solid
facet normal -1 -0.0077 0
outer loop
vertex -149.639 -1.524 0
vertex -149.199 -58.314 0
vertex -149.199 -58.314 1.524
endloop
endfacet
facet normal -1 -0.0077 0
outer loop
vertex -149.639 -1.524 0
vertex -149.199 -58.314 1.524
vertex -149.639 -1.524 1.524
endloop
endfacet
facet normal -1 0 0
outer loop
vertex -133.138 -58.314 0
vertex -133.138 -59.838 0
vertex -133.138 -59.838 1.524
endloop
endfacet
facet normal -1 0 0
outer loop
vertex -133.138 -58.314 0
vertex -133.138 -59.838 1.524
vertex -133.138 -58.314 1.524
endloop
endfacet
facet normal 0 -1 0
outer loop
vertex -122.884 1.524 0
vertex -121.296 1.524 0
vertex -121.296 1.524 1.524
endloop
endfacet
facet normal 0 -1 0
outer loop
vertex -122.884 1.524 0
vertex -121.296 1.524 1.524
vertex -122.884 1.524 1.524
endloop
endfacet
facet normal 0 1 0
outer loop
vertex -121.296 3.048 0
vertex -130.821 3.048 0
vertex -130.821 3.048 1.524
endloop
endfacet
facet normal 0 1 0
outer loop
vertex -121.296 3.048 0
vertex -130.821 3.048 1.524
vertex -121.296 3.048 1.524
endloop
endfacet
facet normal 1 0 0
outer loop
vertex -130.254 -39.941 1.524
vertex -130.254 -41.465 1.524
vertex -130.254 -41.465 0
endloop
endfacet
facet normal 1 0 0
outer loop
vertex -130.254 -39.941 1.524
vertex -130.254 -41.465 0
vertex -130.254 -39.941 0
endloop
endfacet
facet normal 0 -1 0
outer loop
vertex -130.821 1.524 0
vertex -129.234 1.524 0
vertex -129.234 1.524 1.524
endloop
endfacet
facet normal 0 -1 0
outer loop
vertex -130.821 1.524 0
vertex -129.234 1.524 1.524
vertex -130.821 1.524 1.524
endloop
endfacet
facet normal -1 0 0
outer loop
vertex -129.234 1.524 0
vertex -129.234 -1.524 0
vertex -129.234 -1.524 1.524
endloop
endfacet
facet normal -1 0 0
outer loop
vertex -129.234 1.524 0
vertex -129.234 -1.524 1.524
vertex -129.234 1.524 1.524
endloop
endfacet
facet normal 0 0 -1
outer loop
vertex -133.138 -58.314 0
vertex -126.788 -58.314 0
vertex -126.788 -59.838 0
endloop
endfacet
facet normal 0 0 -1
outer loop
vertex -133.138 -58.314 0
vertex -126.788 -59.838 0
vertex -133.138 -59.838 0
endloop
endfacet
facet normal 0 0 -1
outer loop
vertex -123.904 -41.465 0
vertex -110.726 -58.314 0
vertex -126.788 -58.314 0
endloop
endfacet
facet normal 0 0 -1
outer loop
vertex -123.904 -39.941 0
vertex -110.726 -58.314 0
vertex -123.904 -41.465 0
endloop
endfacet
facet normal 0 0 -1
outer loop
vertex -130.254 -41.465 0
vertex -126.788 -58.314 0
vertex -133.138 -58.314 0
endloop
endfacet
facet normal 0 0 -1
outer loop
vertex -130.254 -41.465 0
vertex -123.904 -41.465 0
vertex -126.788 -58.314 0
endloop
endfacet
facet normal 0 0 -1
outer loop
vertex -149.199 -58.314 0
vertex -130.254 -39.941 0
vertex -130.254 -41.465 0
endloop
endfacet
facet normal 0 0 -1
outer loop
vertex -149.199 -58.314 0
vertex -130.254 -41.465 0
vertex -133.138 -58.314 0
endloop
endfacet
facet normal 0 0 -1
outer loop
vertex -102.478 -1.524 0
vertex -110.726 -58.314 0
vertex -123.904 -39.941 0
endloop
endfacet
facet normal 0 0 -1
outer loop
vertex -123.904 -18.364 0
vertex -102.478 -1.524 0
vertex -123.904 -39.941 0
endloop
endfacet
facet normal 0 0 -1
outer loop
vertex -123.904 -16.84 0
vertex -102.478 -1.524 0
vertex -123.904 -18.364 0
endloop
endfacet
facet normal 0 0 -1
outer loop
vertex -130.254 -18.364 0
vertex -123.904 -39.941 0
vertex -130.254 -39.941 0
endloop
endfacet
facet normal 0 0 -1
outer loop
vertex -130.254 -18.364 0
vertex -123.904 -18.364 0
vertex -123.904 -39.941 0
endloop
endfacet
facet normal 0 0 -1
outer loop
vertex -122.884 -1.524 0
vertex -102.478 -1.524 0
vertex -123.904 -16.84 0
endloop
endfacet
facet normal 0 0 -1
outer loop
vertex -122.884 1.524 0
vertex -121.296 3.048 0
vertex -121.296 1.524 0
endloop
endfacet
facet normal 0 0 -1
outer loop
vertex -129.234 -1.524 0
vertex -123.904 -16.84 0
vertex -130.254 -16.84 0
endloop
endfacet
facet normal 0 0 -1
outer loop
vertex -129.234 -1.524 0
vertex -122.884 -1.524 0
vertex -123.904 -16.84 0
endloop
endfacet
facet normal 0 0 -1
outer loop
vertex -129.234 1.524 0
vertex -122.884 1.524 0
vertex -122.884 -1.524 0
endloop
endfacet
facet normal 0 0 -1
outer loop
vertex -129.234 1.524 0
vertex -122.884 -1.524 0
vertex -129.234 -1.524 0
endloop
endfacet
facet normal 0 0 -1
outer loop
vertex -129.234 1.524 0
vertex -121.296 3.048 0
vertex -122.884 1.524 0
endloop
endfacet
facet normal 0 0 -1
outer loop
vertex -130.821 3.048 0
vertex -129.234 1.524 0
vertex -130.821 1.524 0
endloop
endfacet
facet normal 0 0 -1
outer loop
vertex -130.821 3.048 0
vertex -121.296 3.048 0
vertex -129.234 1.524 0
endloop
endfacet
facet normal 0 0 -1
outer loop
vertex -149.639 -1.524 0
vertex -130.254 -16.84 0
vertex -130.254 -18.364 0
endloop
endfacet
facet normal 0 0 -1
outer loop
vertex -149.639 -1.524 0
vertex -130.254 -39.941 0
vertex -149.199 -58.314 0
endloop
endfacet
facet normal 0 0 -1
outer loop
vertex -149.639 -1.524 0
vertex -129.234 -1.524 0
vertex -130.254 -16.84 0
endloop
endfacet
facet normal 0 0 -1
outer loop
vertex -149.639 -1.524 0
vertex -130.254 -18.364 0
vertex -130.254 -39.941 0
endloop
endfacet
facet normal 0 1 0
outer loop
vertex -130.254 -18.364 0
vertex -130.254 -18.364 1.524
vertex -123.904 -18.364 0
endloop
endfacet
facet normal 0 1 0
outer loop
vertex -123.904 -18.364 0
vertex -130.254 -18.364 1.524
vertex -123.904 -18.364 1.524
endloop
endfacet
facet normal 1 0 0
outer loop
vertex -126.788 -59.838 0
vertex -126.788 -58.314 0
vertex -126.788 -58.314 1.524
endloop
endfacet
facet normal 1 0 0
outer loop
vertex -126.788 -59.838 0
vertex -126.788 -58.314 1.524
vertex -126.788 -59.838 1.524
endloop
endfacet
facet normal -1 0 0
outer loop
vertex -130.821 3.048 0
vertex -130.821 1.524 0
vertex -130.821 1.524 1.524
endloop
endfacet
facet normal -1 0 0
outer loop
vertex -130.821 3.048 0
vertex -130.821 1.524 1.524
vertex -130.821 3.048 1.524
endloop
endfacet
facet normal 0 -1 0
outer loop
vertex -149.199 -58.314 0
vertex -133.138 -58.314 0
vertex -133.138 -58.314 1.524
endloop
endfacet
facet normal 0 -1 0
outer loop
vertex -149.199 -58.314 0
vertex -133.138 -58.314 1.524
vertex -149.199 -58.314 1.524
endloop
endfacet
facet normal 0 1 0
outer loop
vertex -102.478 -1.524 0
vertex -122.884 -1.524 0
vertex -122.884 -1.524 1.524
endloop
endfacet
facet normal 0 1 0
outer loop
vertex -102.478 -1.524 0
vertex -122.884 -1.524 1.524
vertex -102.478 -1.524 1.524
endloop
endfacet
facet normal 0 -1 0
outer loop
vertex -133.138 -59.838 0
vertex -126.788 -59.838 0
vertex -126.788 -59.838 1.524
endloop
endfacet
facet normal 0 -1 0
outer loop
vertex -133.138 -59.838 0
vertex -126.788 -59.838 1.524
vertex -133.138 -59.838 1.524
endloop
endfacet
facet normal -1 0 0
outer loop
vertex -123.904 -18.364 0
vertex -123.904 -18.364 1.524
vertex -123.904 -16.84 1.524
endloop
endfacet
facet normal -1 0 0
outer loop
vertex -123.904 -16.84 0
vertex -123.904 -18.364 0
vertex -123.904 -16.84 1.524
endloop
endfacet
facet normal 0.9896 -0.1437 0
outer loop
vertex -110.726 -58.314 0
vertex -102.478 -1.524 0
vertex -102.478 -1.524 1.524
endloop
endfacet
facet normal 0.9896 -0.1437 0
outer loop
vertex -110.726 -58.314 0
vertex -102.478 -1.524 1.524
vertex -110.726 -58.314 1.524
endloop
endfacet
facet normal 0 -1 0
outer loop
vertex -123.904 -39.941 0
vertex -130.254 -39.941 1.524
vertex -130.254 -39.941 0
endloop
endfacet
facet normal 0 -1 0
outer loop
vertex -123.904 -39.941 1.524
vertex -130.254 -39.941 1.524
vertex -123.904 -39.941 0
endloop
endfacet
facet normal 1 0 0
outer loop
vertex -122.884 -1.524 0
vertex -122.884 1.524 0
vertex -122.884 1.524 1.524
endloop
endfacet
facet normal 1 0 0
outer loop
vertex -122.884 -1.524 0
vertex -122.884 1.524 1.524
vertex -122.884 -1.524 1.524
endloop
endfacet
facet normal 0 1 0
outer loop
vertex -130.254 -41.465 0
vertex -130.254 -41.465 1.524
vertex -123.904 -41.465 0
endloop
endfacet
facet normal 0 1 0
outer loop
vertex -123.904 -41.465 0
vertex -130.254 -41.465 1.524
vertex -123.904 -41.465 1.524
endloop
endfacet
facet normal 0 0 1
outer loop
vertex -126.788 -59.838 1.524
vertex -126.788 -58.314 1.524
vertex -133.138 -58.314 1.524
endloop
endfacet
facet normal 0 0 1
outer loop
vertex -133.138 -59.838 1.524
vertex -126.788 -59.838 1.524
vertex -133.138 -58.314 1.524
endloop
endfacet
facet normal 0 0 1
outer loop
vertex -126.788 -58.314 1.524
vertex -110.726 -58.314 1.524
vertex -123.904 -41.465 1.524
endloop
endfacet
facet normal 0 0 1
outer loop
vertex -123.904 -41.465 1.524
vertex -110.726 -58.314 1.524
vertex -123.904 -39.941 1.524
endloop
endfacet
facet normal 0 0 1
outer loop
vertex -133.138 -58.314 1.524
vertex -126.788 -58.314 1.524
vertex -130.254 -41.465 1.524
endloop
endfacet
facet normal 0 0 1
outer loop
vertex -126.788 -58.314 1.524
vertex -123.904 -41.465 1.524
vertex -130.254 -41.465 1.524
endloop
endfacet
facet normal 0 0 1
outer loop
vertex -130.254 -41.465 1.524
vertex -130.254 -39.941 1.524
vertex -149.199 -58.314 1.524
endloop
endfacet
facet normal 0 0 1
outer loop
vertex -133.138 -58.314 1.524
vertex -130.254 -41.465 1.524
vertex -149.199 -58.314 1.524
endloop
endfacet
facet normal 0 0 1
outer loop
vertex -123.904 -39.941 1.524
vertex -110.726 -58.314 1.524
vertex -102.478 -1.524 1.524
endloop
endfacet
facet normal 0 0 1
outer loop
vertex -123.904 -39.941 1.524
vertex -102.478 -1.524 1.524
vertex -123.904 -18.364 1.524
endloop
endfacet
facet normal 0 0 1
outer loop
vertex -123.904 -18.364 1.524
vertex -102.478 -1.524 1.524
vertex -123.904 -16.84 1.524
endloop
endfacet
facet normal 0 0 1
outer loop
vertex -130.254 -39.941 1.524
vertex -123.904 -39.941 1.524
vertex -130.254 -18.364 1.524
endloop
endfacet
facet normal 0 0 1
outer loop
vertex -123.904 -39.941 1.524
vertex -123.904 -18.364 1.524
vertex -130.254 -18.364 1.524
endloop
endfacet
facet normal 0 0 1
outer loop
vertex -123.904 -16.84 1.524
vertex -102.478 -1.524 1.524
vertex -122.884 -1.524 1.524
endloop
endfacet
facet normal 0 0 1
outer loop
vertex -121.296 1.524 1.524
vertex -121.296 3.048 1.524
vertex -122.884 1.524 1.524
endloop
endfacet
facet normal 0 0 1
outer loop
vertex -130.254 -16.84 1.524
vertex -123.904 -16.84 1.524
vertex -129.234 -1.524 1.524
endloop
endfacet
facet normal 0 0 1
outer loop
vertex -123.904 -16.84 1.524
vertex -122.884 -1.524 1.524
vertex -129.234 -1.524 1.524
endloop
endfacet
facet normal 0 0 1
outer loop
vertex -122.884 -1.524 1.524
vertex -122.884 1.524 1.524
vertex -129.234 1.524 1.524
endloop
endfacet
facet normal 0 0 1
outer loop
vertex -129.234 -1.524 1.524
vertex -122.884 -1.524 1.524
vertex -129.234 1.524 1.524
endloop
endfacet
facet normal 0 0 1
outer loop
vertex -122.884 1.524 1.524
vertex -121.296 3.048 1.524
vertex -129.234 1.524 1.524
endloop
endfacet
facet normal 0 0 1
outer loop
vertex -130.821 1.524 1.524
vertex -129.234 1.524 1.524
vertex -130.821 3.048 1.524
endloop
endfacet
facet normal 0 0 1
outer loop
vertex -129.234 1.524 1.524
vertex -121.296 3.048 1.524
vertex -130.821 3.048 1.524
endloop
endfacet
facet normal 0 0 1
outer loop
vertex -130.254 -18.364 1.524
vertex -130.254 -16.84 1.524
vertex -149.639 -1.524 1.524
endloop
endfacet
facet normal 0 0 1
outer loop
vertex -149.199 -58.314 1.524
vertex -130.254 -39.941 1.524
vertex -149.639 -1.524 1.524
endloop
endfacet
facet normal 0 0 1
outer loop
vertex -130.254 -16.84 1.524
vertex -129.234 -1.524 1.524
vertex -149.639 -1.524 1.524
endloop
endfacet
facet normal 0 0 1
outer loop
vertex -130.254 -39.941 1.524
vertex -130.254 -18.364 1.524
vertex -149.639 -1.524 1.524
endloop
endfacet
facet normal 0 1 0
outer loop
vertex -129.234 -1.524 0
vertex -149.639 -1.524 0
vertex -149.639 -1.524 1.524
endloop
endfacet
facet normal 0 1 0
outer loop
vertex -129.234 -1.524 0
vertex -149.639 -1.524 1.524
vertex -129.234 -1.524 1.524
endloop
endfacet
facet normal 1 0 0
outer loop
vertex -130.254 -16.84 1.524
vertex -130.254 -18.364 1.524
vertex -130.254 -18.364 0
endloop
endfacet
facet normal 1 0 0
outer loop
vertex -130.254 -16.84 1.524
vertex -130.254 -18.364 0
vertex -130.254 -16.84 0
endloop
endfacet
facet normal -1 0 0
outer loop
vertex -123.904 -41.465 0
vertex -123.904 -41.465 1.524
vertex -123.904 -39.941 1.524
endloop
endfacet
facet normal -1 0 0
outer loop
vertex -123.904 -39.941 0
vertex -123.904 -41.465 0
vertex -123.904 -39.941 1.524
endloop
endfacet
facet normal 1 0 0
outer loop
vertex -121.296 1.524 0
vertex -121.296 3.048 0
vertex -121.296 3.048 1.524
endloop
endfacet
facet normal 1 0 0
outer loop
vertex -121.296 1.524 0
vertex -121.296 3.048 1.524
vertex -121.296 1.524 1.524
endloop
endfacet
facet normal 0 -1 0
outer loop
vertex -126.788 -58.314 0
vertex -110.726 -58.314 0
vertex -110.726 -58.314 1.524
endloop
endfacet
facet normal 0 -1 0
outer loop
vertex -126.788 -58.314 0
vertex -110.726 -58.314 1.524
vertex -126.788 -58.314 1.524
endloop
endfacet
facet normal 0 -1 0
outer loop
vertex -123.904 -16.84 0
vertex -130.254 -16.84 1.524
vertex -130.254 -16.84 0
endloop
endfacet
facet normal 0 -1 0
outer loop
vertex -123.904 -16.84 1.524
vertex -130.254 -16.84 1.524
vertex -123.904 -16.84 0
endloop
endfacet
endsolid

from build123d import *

# Parameters (mm, degrees)
BOSS_EXTRUDE1_DEPTH = 1.524
SKETCH2_W           = 6.35
SKETCH2_H           = 1.524
CUT_EXTRUDE1_DEPTH  = 1.524


with BuildPart() as part:
    # Sketch1 → Boss-Extrude1 (new body)
    with BuildSketch(Plane.XY):
        Polygon((-102.477755775, -1.524), (-110.726395883, -58.314338926), (-126.787898899, -58.314338926), (-126.787898899, -59.838338926), (-133.137898899, -59.838338926), (-133.137898899, -58.314338926), (-149.199401915, -58.314338926), (-149.6392871, -1.524), (-129.233521437, -1.524), (-129.233521437, 1.524), (-130.821021437, 1.524), (-130.821021437, 3.048), (-121.296021437, 3.048), (-121.296021437, 1.524), (-122.883521437, 1.524), (-122.883521437, -1.524), align=None)
    extrude(amount=BOSS_EXTRUDE1_DEPTH)

    # Sketch2 → Cut-Extrude1 (cut)
    with BuildSketch(Plane.XY.offset(1.524)):
        with Locations((-127.078752717, -40.703047377)):
            Rectangle(SKETCH2_W, SKETCH2_H)
        with Locations((-127.078752717, -17.602011312)):
            Rectangle(SKETCH2_W, SKETCH2_H)
    extrude(amount=-CUT_EXTRUDE1_DEPTH, mode=Mode.SUBTRACT)


solid = part.part
